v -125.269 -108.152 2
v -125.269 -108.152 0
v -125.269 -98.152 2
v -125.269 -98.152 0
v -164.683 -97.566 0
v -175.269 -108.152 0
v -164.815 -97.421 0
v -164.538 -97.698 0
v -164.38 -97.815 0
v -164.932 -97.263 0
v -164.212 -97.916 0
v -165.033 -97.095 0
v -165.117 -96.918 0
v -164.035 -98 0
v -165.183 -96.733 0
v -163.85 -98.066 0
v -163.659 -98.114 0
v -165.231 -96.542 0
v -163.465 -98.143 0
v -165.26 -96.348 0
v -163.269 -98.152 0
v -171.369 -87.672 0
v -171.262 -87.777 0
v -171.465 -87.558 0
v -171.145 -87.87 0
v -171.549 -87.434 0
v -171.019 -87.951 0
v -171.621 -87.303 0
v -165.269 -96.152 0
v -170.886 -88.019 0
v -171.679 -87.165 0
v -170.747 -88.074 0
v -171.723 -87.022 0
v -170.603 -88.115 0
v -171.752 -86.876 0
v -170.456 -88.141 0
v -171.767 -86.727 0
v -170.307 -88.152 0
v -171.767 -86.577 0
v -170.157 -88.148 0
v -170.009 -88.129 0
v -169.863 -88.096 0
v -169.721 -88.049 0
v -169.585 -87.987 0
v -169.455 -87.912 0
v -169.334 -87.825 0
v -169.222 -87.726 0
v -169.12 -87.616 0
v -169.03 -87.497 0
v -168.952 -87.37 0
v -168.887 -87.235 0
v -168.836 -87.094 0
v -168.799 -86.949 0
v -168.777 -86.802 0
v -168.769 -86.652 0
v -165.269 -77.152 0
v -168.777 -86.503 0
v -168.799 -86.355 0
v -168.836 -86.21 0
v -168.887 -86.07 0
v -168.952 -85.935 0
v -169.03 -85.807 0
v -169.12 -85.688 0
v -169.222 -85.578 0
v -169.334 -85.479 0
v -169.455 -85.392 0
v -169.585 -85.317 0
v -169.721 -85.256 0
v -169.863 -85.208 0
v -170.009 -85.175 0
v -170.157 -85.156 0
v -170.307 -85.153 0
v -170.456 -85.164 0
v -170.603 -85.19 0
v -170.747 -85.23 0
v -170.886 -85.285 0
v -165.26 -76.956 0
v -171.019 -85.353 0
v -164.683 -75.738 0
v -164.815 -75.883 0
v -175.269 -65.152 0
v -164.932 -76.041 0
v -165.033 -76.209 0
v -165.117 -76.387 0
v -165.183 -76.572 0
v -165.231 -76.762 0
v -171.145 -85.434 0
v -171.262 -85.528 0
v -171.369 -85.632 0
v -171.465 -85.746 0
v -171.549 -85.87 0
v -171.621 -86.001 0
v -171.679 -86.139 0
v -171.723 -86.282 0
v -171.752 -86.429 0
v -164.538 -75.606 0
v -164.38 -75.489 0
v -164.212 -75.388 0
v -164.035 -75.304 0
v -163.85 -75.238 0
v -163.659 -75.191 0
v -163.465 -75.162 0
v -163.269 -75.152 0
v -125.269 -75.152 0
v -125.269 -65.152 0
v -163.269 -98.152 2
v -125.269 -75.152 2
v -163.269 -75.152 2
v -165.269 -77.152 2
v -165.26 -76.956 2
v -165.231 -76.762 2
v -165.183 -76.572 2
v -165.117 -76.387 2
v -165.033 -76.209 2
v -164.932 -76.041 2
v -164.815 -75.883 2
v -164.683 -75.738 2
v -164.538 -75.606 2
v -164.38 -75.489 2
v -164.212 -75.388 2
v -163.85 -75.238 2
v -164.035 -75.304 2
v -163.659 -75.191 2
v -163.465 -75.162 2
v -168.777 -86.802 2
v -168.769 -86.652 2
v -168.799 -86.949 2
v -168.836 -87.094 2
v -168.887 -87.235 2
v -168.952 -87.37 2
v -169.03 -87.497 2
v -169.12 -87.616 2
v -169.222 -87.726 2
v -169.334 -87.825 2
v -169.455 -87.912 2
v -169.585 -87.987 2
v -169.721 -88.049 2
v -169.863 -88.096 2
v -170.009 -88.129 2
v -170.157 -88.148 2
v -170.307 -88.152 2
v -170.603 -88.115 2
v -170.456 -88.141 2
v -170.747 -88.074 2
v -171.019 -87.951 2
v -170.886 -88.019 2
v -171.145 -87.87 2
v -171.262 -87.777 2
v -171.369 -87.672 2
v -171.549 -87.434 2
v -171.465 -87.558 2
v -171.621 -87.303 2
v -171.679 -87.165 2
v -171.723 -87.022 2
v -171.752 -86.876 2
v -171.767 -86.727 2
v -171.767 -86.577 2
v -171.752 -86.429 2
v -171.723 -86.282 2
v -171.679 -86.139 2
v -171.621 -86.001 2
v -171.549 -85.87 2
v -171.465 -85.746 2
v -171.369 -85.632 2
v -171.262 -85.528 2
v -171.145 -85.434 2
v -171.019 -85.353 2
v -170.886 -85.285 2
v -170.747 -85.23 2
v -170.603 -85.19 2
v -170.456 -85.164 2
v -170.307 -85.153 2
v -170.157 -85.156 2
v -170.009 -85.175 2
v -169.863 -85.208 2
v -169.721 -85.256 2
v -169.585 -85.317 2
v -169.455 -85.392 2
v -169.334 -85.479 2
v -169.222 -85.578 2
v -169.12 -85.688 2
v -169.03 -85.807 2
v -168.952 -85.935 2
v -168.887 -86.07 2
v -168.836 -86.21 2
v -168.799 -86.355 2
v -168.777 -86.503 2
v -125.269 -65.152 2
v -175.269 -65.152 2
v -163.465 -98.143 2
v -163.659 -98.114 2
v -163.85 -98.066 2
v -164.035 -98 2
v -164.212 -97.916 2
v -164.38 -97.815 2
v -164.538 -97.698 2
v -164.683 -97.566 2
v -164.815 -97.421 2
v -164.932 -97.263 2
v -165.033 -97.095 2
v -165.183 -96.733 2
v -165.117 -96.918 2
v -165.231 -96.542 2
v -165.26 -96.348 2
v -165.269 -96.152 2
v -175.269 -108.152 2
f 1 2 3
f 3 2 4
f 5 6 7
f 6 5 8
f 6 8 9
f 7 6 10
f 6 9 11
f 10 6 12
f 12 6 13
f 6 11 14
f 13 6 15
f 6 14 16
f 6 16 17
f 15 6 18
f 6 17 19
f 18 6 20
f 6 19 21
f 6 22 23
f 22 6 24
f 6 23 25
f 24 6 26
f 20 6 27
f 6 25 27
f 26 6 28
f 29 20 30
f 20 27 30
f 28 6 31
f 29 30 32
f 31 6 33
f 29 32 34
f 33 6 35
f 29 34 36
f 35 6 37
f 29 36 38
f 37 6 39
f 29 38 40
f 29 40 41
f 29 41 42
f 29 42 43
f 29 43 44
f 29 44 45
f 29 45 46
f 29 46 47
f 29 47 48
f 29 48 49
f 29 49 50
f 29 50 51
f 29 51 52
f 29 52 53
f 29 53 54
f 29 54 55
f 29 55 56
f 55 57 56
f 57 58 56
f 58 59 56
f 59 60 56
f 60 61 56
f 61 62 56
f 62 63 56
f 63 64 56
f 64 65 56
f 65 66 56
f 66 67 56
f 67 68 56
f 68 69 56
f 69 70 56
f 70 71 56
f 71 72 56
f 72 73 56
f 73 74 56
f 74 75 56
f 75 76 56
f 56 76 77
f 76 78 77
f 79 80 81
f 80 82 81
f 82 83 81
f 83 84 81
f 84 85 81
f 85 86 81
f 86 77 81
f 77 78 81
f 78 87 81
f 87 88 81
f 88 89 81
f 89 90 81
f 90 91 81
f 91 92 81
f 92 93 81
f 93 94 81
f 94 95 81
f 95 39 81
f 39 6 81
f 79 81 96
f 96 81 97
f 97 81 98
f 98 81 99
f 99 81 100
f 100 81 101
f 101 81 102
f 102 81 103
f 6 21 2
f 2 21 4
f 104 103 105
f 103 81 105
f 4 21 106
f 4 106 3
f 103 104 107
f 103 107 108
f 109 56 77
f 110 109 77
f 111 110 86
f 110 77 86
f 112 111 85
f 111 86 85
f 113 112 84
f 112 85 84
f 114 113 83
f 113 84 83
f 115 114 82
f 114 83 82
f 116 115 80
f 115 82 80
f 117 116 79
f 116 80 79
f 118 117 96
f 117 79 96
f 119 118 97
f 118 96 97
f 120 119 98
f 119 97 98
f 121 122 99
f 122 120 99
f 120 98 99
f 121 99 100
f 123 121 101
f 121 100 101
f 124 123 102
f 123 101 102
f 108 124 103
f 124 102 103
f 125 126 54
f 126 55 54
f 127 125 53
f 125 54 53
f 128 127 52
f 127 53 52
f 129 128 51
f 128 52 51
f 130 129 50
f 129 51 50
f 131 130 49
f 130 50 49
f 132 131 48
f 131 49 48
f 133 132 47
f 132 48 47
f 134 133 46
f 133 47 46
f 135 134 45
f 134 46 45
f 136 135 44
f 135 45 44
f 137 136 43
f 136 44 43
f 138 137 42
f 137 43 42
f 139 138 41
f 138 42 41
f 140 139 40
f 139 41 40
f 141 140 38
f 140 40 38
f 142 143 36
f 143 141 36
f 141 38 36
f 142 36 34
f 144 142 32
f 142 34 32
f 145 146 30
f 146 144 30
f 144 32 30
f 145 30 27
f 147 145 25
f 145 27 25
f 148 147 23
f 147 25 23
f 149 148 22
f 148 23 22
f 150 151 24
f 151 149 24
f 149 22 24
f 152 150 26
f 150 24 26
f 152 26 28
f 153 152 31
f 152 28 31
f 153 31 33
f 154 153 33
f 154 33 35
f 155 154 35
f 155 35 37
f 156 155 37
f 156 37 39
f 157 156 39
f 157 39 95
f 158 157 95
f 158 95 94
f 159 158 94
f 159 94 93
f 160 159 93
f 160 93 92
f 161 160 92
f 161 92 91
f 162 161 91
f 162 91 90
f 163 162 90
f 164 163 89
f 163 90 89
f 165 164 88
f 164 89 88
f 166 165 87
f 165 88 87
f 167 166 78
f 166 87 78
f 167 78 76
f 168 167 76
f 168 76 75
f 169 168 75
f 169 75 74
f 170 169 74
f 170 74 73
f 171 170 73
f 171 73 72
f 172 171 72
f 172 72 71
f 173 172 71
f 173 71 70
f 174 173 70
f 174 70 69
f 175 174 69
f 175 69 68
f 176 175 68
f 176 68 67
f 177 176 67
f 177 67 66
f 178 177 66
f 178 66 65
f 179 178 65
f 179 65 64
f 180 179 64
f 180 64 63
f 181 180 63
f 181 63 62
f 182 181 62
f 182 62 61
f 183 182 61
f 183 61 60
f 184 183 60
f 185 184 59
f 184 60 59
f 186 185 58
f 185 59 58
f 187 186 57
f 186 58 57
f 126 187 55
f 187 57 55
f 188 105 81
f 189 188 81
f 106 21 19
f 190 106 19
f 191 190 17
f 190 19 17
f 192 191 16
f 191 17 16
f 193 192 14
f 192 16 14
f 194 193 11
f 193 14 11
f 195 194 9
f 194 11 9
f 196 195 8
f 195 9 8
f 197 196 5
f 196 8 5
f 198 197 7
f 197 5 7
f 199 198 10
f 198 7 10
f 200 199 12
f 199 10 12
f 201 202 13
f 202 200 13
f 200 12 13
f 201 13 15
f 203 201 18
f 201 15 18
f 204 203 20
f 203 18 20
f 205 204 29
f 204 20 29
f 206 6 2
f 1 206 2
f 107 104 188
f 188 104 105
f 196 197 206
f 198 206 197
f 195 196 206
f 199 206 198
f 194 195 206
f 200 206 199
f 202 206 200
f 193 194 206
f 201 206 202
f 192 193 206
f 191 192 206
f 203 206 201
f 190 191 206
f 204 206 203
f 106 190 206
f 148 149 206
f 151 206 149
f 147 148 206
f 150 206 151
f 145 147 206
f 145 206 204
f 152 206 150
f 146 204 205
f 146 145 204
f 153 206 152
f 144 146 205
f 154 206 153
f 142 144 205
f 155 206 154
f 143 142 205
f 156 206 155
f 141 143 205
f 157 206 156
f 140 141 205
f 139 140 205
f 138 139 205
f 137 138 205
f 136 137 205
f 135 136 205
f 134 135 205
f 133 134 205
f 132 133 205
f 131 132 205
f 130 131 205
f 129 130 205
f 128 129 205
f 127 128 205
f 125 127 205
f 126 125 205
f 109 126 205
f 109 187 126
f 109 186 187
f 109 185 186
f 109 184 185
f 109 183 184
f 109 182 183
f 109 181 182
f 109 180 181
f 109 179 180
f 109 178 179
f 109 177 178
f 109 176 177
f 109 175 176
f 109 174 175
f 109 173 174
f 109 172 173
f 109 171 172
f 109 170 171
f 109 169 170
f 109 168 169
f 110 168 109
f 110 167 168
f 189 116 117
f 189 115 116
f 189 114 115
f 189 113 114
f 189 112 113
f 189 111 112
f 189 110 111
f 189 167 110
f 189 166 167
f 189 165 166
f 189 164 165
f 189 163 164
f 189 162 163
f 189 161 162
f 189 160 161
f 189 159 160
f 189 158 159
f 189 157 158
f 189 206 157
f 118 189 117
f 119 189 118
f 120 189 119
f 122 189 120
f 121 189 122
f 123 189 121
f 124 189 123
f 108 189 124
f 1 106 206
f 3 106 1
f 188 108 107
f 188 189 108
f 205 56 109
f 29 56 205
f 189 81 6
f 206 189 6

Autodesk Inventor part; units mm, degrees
ref_plane "YZ Plane" through (0, 0, 0) normal (1, 0, 0) x (0, 1, 0)
ref_plane "XZ Plane" through (0, 0, 0) normal (0, 1, 0) x (-1, 0, 0)
ref_plane "XY Plane" through (0, 0, 0) normal (0, 0, 1) x (1, 0, 0)
sketch "Sketch1" plane through (0, 0, 0) normal (0, 0, 1) x (1, 0, 0)
  circle A0 centre (-170.2692, -86.6522) radius 1.5
  line L0 (-175.2692, -65.1522) -> (-175.2692, -108.1522)
  arc A1 (-163.2692, -75.1522) -> (-165.2692, -77.1522) centre (-163.2692, -77.1522) ccw
  line L1 (-125.2692, -65.1522) -> (-175.2692, -65.1522)
  line L2 (-165.2692, -77.1522) -> (-165.2692, -96.1522)
  line L3 (-125.2692, -75.1522) -> (-125.2692, -65.1522)
  line L4 (-125.2692, -75.1522) -> (-163.2692, -75.1522)
  arc A2 (-165.2692, -96.1522) -> (-163.2692, -98.1522) centre (-163.2692, -96.1522) ccw
  line L5 (-175.2692, -108.1522) -> (-125.2692, -108.1522)
  line L6 (-125.2692, -108.1522) -> (-125.2692, -98.1522)
  line L7 (-163.2692, -98.1522) -> (-125.2692, -98.1522)
  point P0 (0, 0)
  point P1 (-165.2692, -75.1522)
  point P2 (-165.2692, -98.1522)
  dimension "d0" = 40
  dimension "d1" = 23
  dimension "d2" = 2
  dimension "d3" = 10
  dimension "d4" = 50
  dimension "d5" = 43
  dimension "d6" = 3
  dimension "d7" = 5
  dimension "d8" = 21.5
extrude "Extrusion1" add sketch "Sketch1" along normal blind 2
properties part number "cetakan sepatu 2"
